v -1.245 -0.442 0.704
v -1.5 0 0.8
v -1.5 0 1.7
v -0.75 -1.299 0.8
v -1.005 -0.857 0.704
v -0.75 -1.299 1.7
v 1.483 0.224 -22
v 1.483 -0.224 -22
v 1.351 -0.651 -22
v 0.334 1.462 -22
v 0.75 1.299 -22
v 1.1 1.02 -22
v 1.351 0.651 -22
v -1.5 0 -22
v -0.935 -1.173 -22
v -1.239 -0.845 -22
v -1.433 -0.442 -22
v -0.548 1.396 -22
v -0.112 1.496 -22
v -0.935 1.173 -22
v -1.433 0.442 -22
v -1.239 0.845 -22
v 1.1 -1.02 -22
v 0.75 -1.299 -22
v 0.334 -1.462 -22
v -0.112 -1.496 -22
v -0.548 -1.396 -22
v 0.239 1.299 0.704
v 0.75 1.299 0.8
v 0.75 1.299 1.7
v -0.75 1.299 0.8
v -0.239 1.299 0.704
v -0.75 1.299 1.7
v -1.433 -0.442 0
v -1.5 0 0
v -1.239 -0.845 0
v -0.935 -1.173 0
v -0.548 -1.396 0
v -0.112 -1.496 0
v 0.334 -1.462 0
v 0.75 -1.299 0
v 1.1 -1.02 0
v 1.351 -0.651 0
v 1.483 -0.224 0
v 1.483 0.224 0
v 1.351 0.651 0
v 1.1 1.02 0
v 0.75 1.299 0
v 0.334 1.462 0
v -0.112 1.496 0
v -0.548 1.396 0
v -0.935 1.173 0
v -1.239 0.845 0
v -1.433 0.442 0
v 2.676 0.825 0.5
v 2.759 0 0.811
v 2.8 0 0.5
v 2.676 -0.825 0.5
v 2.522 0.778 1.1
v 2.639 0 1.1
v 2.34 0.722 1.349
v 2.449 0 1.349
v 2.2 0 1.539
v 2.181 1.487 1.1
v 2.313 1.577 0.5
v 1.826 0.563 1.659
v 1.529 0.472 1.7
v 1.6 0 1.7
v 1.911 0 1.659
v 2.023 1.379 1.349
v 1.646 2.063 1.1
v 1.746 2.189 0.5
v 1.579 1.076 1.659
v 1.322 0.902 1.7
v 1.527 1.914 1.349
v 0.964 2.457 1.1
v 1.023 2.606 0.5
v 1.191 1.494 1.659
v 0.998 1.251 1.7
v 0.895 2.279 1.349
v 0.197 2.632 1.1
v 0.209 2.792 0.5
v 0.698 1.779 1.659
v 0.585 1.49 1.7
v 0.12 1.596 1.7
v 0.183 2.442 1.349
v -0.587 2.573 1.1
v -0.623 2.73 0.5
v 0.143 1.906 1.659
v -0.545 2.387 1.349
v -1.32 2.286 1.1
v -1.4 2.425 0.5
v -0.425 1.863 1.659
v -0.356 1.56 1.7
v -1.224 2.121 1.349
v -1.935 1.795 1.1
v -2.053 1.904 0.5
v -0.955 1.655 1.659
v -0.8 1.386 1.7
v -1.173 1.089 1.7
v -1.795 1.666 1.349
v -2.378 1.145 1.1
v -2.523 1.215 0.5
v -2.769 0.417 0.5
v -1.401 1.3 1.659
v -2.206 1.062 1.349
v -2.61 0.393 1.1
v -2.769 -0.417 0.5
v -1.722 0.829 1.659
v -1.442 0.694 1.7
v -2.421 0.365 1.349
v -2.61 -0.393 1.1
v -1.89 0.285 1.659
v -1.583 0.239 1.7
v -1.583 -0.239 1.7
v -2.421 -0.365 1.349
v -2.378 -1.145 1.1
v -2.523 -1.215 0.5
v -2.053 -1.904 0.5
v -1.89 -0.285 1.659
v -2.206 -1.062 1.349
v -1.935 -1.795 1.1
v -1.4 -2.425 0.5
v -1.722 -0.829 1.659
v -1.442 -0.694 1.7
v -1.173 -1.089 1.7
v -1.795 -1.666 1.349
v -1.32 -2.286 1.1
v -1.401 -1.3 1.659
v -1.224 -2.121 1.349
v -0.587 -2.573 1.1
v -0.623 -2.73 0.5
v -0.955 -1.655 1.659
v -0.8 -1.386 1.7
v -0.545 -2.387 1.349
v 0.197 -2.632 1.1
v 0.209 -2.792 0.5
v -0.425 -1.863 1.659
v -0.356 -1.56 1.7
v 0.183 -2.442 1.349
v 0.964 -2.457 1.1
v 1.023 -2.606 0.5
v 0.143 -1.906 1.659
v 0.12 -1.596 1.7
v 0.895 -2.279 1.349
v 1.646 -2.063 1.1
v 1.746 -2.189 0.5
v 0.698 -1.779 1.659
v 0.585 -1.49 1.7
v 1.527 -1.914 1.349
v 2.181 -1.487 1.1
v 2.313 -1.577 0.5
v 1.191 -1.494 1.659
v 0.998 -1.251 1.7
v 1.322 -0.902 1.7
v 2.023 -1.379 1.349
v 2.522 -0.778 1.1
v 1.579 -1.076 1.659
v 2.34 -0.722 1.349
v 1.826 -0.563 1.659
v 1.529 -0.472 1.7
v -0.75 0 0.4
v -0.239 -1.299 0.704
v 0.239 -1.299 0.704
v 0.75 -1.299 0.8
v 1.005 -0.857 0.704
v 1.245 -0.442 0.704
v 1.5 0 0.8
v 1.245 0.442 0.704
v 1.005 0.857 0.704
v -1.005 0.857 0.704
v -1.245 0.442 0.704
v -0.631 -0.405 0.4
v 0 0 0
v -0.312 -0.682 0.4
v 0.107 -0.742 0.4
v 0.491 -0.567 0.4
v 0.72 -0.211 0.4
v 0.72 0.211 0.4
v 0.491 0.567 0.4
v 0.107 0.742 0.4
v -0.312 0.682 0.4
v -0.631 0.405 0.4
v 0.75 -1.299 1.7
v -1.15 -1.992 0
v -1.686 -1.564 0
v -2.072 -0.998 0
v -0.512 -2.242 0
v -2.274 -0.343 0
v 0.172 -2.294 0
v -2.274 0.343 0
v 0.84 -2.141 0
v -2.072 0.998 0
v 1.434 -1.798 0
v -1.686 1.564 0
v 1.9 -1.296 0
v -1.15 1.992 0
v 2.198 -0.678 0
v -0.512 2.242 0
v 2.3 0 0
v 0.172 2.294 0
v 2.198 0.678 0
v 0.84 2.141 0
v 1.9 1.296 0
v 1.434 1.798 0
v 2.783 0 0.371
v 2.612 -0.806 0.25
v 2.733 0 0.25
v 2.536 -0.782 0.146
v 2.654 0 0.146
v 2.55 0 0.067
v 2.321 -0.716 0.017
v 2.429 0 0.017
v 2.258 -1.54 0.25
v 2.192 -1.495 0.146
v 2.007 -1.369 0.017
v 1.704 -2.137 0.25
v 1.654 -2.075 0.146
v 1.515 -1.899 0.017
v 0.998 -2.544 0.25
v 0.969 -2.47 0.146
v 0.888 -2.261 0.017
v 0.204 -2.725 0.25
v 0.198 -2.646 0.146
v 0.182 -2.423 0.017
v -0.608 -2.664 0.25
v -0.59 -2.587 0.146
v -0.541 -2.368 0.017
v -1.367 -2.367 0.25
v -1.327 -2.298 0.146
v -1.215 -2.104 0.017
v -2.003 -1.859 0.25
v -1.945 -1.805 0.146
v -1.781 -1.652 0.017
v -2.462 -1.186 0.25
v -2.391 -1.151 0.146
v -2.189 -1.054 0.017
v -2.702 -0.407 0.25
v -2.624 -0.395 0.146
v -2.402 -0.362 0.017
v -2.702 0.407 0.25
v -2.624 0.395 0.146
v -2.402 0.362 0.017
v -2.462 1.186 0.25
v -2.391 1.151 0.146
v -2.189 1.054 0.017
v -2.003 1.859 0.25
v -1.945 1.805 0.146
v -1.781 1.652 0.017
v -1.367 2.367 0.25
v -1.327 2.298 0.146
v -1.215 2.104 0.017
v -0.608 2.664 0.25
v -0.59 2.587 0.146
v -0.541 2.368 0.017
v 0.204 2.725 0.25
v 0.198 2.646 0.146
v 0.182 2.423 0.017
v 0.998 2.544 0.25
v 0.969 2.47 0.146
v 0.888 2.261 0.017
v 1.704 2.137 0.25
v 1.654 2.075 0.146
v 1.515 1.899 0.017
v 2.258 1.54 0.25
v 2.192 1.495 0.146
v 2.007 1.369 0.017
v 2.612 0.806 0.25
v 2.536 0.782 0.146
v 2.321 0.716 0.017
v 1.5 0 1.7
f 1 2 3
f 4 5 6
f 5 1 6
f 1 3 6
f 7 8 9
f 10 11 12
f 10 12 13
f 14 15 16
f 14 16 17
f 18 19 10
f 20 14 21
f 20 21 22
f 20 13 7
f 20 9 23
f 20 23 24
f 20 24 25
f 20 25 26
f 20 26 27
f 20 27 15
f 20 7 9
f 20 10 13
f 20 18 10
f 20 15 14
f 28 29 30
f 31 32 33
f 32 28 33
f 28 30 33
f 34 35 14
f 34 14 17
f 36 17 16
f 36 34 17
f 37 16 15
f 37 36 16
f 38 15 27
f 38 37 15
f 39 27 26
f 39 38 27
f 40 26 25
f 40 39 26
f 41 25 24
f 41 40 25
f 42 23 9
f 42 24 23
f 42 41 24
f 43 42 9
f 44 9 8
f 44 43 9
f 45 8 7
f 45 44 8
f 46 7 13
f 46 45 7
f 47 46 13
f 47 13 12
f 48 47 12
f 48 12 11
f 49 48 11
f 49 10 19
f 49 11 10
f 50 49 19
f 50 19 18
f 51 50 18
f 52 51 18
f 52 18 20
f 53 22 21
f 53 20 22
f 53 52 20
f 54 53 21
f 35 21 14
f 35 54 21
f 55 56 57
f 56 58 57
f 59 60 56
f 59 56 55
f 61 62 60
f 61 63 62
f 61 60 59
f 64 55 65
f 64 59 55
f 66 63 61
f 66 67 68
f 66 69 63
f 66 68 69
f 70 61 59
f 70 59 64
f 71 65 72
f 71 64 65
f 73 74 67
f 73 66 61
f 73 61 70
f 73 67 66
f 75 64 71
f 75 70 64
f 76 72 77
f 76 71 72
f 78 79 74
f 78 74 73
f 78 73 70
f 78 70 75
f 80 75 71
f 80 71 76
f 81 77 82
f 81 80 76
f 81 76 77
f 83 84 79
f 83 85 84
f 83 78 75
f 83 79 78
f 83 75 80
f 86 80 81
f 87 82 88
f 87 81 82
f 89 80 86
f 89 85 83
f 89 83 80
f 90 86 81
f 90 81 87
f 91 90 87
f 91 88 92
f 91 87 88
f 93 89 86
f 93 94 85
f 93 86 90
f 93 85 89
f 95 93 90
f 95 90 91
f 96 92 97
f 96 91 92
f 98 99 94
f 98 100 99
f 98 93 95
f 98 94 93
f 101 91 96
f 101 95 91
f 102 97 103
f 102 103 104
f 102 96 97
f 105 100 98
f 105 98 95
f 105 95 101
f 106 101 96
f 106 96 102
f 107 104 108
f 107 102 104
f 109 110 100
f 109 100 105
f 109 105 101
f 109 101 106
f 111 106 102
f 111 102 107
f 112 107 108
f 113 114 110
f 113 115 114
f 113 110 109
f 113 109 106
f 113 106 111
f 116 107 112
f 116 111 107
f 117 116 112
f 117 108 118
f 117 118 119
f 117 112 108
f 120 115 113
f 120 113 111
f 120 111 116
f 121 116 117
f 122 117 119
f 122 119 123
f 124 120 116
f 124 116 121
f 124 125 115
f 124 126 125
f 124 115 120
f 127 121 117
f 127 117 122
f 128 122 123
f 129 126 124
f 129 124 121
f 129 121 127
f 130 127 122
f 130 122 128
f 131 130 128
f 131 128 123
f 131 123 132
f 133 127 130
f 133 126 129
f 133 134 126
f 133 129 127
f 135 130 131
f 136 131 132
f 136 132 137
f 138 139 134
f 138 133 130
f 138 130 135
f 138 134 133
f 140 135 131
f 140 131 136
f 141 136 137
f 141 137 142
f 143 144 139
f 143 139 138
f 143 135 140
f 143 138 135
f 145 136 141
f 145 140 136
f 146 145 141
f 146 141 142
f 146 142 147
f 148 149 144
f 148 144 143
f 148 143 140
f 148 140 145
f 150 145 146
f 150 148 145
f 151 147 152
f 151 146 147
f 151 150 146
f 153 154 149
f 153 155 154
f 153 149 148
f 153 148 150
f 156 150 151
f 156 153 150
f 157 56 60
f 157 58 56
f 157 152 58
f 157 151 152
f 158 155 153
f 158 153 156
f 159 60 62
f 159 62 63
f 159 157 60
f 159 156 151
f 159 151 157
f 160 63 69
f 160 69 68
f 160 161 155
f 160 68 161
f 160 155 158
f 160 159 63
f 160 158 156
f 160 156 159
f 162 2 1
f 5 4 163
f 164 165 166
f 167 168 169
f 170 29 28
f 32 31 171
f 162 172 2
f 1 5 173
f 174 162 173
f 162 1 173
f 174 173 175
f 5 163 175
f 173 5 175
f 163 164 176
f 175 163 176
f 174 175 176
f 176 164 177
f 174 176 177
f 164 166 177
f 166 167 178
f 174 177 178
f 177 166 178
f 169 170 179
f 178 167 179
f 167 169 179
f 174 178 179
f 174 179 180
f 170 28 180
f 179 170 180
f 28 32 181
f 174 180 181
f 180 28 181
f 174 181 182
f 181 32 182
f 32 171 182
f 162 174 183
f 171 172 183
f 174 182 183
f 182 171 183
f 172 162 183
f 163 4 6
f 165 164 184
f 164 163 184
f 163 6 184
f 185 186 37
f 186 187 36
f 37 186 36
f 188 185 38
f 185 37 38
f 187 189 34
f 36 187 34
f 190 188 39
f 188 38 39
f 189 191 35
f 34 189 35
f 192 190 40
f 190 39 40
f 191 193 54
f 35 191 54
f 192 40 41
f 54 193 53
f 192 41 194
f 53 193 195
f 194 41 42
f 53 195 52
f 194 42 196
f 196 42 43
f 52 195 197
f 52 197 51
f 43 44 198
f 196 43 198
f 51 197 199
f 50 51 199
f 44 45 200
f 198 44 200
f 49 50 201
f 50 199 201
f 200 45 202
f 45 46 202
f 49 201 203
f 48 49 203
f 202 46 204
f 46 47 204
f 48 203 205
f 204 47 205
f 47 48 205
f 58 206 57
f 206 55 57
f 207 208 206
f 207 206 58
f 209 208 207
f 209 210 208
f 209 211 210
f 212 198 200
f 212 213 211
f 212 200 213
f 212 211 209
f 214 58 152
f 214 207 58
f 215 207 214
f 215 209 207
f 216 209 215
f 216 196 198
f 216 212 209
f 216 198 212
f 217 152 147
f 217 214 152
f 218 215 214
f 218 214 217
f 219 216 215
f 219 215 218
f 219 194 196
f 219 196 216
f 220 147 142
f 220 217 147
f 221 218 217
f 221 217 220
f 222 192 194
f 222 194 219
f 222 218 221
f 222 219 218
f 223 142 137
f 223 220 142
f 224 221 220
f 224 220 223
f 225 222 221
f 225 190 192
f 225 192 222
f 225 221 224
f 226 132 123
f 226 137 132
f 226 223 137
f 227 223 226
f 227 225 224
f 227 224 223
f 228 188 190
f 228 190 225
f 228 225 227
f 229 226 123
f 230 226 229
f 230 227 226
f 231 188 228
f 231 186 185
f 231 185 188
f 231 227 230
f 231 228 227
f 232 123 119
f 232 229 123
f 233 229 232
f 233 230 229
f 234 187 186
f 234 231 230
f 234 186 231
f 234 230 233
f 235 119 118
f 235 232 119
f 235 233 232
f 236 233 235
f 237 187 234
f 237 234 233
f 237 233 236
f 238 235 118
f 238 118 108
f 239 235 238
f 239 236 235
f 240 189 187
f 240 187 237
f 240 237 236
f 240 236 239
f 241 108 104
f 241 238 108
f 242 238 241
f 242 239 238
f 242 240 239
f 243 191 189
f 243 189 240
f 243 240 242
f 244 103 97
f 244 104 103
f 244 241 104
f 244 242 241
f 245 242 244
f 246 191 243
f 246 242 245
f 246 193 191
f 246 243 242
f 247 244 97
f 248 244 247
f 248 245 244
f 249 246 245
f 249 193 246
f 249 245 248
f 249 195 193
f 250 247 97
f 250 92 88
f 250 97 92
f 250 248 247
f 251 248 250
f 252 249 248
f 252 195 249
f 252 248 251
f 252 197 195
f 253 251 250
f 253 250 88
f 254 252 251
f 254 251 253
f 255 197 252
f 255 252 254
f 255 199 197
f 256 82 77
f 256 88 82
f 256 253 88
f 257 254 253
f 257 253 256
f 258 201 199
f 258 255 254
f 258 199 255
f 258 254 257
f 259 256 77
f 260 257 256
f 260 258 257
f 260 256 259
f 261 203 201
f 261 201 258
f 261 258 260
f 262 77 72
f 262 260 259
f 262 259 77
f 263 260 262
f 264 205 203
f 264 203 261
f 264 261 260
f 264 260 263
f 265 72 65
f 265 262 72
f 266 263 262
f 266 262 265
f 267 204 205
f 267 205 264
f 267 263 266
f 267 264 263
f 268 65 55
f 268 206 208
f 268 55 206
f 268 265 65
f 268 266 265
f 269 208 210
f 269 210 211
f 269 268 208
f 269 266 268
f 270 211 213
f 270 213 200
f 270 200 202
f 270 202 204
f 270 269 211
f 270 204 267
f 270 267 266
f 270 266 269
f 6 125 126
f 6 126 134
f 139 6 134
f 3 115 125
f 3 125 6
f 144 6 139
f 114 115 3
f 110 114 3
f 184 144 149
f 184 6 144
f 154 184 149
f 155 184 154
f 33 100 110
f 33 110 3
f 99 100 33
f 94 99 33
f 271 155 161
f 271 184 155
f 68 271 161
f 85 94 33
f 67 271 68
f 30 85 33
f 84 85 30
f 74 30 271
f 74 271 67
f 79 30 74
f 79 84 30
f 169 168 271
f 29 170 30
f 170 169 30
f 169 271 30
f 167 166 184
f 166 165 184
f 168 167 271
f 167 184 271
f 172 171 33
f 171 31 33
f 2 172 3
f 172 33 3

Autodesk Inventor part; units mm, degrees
ref_plane "YZ Plane" through (0, 0, 0) normal (1, 0, 0) x (0, 1, 0)
ref_plane "XZ Plane" through (0, 0, 0) normal (0, 1, 0) x (-1, 0, 0)
ref_plane "XY Plane" through (0, 0, 0) normal (0, 0, 1) x (1, 0, 0)
sketch "Sketch1" plane through (0, 0, 0) normal (0, 0, 1) x (1, 0, 0)
  circle A0 centre (0, 0) radius 2.8
  dimension "d0" = 5.6
extrude "Extrusion1" add sketch "Sketch1" along normal blind 1.7
fillet "Fillet3" radius 0.5 1 edges at (-2.8, 0, 0)
fillet "Fillet4" radius 1.2 1 edges at (-2.8, 0, 1.7)
sketch "Sketch2" plane through (0, 0, 1.7) normal (0, 0, 1) x (1, 0, 0)
  line L0 (-0.75, -1.299) -> (0.75, -1.299)
  line L1 (0.75, -1.299) -> (1.5, 0)
  line L2 (1.5, 0) -> (0.75, 1.299)
  line L3 (0.75, 1.299) -> (-0.75, 1.299)
  line L4 (-0.75, 1.299) -> (-1.5, 0)
  line L5 (-1.5, 0) -> (-0.75, -1.299)
  dimension "d7" = 3
extrude "Extrusion2" cut sketch "Sketch2" against normal blind 1.7
sketch "Sketch3" plane through (0, 0, 0) normal (0, 1, 0) x (-1, 0, 0)
  line L0 (0, 0) -> (1.5, 0)
  line L1 (2.3, 0) -> (-2.3, 0) projected
  line L2 (1.5, 0) -> (1.5, 0.8)
  line L3 (1.5, 0.8) -> (0, 0)
  line L4 (0, 0) -> (0, 2.432)
  dimension "d13" = 0
  dimension "d14" = 1.5
  dimension "d15" = 0.8
revolve "Revolution2" add sketch "Sketch3" angle 360 about axis through (0, 0, 0) along (0, 0, 1)
sketch "Sketch4" plane through (0, 0, 0) normal (0, 0, -1) x (-1, 0, 0)
  circle A0 centre (0, 0) radius 2.3 projected
  circle A1 centre (0, 0) radius 1.5
  dimension "d18" = 3
extrude "Extrusion3" add sketch "Sketch4" along normal blind 22 contours A1
thread "Thread1" size "M3x0.5" class "6g" standard "ANSI Metric M Profile" full length
properties part number "screw_M3_16_hex"
